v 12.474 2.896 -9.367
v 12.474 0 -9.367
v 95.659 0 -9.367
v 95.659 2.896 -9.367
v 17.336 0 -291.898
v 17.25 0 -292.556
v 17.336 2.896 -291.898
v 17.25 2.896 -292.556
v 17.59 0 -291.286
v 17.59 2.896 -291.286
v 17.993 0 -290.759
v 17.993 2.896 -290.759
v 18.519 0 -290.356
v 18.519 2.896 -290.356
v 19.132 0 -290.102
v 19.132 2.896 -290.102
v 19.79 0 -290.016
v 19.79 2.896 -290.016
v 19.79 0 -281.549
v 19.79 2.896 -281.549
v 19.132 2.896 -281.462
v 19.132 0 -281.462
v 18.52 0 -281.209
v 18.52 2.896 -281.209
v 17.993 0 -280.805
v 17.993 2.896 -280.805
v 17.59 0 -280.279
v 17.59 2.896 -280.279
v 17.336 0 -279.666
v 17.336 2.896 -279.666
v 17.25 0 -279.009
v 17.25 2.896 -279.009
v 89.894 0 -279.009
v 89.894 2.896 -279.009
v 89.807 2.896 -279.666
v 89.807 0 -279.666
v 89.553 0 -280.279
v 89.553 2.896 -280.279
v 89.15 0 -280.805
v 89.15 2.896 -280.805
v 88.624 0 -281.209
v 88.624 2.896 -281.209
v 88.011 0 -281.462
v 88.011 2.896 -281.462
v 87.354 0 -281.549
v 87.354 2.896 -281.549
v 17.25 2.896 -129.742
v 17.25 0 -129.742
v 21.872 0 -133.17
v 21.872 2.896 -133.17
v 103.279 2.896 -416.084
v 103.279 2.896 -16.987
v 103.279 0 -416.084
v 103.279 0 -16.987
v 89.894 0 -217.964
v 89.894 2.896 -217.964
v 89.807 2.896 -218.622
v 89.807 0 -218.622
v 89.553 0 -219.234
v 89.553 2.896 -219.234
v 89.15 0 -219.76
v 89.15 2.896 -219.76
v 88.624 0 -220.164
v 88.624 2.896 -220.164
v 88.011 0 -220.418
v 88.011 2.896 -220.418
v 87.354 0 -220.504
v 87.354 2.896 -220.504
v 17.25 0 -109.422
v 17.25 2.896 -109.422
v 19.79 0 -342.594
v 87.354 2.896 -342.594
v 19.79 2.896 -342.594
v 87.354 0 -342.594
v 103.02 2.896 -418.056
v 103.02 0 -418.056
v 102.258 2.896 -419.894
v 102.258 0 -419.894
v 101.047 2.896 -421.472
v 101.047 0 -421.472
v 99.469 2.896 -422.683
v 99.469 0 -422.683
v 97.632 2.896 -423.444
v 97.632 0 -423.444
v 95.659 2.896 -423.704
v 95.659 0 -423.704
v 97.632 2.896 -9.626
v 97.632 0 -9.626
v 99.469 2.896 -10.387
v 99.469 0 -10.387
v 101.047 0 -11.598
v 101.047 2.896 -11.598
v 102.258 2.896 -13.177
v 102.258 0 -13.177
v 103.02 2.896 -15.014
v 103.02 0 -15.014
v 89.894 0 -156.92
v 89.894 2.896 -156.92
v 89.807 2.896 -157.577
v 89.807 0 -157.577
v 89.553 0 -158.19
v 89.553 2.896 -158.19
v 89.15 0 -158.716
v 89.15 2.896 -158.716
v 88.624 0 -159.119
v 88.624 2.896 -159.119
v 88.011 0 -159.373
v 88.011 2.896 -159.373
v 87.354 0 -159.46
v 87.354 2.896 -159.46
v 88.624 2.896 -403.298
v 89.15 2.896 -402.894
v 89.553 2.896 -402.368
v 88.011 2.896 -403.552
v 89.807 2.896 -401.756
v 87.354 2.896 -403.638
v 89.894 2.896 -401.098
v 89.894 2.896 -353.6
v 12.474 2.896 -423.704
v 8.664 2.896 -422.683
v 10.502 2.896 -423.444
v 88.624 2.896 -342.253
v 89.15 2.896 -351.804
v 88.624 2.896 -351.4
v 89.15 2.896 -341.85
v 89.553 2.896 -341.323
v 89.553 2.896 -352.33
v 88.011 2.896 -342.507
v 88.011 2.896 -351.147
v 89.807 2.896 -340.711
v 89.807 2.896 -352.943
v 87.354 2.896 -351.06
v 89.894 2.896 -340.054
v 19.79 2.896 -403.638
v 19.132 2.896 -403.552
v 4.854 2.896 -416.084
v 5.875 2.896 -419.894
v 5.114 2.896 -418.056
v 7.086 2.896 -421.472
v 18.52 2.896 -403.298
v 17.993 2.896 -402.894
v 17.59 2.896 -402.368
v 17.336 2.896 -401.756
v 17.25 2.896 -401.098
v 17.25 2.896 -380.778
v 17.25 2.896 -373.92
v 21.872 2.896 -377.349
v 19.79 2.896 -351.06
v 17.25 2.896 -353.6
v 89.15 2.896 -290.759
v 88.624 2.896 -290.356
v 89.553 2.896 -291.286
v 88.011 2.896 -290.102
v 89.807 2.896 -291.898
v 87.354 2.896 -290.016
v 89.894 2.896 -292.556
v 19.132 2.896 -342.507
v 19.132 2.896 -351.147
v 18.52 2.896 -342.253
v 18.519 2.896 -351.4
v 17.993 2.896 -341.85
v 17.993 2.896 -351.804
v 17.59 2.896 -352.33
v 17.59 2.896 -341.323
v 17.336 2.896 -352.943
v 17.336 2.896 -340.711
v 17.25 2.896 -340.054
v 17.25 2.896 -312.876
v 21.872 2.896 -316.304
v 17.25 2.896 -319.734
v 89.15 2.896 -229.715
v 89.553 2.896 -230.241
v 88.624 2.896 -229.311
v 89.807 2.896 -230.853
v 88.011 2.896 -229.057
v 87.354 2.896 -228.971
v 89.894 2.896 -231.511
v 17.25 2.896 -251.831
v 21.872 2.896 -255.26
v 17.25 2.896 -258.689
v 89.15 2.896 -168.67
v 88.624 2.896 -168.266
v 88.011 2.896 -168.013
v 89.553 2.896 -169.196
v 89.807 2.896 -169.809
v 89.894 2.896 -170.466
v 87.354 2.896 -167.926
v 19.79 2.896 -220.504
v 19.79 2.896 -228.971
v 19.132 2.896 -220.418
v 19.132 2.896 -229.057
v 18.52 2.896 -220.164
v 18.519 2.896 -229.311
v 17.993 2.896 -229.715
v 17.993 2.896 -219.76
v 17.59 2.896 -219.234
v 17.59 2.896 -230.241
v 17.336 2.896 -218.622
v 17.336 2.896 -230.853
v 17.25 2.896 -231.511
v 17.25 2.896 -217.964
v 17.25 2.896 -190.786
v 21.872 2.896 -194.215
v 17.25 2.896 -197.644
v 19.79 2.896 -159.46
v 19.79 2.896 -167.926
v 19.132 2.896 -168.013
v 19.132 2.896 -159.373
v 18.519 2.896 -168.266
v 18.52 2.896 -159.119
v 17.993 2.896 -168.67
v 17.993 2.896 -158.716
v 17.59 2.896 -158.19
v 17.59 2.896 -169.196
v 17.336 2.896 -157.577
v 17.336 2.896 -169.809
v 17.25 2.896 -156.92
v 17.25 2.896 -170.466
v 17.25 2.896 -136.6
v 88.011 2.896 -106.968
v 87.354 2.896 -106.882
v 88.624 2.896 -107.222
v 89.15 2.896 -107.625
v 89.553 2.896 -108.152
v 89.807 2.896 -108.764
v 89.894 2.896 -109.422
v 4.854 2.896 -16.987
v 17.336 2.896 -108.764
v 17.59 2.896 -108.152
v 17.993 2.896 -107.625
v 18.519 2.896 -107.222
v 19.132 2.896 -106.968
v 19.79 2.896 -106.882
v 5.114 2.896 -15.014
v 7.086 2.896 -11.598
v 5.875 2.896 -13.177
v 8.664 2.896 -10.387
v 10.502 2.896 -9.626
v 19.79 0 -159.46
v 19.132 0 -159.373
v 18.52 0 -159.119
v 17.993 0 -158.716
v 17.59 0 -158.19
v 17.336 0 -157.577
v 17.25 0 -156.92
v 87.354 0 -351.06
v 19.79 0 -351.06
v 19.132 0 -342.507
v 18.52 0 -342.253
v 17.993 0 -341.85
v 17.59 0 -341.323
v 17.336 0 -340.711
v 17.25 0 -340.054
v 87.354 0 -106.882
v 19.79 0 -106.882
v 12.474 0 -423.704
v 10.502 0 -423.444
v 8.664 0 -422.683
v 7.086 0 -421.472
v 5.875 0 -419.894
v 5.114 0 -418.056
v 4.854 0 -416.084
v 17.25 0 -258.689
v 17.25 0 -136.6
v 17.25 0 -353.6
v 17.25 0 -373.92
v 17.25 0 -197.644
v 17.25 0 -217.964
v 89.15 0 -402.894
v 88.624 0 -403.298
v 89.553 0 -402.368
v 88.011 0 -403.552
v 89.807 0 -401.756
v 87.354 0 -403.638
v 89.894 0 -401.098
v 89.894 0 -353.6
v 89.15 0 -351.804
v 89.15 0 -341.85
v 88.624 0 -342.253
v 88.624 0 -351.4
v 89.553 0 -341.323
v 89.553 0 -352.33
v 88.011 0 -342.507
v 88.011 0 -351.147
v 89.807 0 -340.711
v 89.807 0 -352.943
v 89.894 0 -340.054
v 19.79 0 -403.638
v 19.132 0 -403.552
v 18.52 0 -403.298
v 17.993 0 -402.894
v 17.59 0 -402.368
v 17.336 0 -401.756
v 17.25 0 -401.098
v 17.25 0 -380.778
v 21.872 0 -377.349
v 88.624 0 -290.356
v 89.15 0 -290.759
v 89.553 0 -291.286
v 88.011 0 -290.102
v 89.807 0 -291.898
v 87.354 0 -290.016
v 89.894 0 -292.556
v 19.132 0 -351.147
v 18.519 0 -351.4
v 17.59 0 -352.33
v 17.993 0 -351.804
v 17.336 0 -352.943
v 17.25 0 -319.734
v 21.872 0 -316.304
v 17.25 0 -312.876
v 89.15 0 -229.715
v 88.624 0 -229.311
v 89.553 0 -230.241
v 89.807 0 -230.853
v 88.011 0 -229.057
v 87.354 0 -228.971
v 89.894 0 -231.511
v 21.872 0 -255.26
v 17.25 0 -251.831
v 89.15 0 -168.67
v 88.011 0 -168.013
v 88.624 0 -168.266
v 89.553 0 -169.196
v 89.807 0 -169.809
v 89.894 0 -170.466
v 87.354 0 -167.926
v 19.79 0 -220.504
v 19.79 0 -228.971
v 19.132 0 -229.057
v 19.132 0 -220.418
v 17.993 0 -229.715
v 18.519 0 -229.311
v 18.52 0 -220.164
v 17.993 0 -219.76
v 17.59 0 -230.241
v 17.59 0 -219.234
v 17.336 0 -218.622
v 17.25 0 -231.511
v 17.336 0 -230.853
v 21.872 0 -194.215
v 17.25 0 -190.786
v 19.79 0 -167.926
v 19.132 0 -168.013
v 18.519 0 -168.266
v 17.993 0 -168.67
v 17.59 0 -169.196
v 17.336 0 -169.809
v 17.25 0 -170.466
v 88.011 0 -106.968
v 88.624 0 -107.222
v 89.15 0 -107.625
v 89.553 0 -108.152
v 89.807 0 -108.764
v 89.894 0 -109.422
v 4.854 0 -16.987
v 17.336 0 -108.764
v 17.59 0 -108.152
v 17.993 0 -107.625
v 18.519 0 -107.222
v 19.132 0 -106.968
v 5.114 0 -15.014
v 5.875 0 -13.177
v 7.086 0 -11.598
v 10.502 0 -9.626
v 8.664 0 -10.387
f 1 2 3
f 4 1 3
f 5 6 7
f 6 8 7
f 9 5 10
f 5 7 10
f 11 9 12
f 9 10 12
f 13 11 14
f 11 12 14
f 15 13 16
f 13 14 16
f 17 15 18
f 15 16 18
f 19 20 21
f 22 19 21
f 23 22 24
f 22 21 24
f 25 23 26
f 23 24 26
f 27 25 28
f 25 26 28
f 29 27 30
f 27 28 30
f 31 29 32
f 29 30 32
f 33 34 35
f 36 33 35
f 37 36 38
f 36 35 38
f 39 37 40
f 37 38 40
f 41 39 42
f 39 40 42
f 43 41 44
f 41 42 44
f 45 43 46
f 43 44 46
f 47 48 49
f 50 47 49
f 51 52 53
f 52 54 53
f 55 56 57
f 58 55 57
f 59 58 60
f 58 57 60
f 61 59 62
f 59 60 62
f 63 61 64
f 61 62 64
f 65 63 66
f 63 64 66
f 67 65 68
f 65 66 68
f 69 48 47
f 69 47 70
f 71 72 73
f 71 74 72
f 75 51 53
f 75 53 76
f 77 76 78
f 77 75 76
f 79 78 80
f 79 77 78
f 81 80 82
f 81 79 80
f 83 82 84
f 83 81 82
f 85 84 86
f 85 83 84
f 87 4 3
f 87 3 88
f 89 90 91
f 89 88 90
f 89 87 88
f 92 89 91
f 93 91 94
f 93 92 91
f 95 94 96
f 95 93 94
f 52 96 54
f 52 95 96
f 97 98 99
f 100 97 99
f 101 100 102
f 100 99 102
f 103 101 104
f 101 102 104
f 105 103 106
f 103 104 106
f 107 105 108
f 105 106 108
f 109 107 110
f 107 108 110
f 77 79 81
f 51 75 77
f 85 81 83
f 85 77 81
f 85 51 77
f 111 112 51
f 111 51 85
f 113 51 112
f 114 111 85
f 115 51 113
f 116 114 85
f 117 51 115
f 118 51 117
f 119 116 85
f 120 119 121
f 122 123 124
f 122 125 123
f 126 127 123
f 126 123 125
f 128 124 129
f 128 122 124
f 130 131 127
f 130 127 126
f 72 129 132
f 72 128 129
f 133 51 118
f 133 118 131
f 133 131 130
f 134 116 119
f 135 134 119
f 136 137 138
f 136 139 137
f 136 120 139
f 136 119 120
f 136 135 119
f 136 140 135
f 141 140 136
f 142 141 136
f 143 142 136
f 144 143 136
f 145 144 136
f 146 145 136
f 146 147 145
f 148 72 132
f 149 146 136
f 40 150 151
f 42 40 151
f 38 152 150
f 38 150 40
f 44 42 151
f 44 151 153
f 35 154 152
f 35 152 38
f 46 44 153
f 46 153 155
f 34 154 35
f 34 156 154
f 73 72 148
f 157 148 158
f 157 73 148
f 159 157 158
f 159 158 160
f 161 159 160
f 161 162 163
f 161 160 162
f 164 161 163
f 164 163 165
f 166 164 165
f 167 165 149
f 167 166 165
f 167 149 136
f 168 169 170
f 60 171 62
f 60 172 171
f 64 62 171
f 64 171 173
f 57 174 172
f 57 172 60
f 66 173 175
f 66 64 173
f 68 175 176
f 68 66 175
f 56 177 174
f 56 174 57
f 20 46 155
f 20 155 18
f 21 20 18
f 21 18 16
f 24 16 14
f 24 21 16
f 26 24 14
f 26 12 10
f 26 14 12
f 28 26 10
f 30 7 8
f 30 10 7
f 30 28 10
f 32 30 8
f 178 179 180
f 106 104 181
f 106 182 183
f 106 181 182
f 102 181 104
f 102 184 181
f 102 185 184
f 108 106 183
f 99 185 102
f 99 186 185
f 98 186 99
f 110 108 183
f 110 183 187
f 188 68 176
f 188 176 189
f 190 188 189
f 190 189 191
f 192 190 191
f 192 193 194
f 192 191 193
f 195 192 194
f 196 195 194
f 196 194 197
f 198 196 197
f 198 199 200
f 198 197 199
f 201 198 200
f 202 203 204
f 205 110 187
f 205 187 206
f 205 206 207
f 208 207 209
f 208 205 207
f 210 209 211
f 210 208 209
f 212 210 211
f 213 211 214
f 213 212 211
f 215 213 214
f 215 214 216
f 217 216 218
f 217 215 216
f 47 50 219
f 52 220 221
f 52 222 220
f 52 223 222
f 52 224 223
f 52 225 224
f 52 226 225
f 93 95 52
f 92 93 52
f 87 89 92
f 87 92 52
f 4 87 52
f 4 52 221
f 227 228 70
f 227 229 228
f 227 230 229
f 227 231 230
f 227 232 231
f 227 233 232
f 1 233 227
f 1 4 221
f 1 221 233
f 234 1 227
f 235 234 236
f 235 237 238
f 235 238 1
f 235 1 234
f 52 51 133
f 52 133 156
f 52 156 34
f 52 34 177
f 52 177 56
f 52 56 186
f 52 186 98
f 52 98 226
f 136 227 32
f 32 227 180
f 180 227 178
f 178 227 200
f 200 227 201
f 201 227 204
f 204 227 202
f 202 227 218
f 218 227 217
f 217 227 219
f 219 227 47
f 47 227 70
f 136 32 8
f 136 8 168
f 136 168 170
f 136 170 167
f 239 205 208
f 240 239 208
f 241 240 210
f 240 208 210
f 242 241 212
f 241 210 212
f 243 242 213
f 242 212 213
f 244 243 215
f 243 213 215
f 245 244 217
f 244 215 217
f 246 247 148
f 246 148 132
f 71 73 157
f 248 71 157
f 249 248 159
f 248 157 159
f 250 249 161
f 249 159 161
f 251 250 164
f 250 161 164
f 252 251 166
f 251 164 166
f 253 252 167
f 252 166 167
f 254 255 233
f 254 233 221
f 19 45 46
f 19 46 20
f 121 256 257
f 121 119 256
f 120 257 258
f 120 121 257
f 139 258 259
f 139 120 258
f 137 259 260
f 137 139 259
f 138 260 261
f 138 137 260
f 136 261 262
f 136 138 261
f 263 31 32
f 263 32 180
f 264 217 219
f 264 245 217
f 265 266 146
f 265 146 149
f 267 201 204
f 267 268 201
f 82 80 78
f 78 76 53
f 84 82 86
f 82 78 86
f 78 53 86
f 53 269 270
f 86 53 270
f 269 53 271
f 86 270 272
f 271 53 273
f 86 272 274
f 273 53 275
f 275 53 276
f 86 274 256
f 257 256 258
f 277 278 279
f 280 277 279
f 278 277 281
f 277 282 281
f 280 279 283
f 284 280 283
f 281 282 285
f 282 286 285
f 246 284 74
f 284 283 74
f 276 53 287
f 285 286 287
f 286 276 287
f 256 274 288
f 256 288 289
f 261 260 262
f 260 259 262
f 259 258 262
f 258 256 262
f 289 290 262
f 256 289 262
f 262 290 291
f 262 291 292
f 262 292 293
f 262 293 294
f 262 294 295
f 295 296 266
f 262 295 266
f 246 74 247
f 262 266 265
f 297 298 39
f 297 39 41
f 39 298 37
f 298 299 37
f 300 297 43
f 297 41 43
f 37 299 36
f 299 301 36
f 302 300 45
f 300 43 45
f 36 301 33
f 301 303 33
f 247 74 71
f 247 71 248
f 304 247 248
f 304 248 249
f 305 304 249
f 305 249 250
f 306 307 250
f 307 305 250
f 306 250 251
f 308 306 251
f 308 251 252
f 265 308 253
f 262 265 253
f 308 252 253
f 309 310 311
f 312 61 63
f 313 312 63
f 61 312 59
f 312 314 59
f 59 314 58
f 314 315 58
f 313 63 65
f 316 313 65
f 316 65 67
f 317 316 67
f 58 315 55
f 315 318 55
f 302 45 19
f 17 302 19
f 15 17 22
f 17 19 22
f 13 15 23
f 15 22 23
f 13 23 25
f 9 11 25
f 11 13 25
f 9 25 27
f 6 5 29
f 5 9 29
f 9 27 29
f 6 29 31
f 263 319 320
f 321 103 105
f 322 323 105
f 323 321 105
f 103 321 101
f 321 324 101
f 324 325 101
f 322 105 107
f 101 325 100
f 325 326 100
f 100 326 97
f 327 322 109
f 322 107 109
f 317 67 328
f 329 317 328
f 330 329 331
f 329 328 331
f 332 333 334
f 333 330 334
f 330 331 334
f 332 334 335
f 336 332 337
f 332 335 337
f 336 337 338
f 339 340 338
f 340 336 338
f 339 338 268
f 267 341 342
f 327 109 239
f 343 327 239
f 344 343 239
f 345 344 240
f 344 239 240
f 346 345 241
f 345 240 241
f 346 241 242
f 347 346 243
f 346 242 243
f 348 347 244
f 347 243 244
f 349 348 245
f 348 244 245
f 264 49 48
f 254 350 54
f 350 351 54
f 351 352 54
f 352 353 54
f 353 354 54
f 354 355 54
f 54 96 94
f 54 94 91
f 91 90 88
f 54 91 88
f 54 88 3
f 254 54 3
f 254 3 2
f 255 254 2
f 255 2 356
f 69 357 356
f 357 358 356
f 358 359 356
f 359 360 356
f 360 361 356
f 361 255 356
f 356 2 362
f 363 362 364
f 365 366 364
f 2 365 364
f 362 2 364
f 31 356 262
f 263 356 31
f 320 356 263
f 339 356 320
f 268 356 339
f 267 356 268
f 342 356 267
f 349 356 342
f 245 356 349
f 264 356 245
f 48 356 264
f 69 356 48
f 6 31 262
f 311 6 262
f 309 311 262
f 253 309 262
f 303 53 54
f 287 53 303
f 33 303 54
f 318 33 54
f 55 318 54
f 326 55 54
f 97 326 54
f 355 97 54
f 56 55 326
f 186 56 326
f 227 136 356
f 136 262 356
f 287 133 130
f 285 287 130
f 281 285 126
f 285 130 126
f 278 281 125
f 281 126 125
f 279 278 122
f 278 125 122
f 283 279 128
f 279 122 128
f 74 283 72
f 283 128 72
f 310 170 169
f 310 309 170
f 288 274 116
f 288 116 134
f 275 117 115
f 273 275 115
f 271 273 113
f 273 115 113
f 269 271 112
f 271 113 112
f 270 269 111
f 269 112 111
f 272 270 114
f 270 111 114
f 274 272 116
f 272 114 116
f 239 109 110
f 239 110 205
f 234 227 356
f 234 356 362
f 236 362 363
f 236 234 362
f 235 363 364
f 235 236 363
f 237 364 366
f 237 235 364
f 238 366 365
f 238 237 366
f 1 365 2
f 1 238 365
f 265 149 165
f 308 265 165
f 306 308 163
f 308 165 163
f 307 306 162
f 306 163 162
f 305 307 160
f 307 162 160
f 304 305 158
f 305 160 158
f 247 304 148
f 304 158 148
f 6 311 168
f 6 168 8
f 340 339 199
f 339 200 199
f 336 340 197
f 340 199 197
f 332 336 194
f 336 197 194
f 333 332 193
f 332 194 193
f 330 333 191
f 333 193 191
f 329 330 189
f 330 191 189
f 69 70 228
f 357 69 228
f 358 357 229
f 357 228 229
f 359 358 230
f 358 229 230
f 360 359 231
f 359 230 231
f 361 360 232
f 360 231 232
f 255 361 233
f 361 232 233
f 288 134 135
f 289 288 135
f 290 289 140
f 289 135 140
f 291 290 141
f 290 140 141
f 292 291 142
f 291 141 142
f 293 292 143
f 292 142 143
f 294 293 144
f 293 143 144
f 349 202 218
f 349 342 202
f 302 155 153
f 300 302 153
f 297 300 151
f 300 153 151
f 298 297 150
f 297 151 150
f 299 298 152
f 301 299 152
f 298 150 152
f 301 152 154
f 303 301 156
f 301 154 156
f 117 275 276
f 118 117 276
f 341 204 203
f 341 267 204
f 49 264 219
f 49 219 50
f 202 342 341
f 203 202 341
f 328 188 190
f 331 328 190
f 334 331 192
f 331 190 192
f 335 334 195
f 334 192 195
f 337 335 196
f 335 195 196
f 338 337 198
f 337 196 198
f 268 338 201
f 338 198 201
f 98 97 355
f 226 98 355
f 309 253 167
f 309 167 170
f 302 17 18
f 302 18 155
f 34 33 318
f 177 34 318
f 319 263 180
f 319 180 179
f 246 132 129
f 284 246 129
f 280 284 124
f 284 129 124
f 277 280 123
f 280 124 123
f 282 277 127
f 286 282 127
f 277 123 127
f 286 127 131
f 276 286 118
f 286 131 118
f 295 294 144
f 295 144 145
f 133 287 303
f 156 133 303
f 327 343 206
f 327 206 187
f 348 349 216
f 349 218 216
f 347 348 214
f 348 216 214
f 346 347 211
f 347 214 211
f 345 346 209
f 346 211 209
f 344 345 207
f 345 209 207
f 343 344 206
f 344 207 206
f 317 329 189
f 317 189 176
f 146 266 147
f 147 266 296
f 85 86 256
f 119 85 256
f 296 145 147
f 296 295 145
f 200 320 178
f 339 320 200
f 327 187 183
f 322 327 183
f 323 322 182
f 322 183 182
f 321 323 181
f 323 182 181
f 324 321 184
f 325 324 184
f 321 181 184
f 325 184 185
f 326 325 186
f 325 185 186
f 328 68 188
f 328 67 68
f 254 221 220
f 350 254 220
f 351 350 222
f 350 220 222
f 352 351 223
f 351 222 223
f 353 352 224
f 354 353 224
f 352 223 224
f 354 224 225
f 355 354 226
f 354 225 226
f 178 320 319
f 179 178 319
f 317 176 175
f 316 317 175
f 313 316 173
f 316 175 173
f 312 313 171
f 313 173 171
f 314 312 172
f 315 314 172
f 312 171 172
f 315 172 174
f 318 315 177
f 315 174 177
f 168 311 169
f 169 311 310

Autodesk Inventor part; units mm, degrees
ref_plane "YZ Plane" through (0, 0, 0) normal (1, 0, 0) x (0, 1, 0)
ref_plane "XZ Plane" through (0, 0, 0) normal (0, 1, 0) x (-1, 0, 0)
ref_plane "XY Plane" through (0, 0, 0) normal (0, 0, 1) x (1, 0, 0)
sketch "Sketch1" plane through (0, 0, 0) normal (0, 1, 0) x (-1, 0, 0)
  line L0 (-4.8543, -9.3666) -> (-103.2793, -9.3666)
  line L1 (-103.2793, -9.3666) -> (-103.2793, -423.7041)
  line L2 (-103.2793, -423.7041) -> (-4.8543, -423.7041)
  line L3 (-4.8543, -423.7041) -> (-4.8543, -9.3666)
  line L4 (-103.2793, -423.7041) -> (-89.8935, -423.7041) construction
  line L5 (-103.2793, -423.7041) -> (-89.8935, -423.7041) construction
  line L6 (-89.8935, -423.7041) -> (-89.8935, -403.6381) construction
  line L7 (-89.8935, -403.6381) -> (-89.8935, -351.0601)
  line L8 (-89.8935, -351.0601) -> (-89.8935, -342.5935) construction
  line L9 (-89.8935, -342.5935) -> (-89.8935, -290.0155)
  line L10 (-89.8935, -290.0155) -> (-89.8935, -281.5488) construction
  line L11 (-89.8935, -281.5488) -> (-89.8935, -228.9708)
  line L12 (-89.8935, -228.9708) -> (-89.8935, -220.5041) construction
  line L13 (-89.8935, -220.5041) -> (-89.8935, -167.9261)
  line L14 (-89.8935, -167.9261) -> (-89.8935, -159.4595) construction
  line L15 (-89.8935, -159.4595) -> (-89.8935, -106.8815)
  line L16 (-89.8935, -403.6381) -> (-17.2495, -403.6381)
  line L17 (-17.2495, -351.0601) -> (-89.8935, -351.0601)
  line L18 (-89.8935, -342.5935) -> (-17.2495, -342.5935)
  line L19 (-17.2495, -290.0155) -> (-89.8935, -290.0155)
  line L20 (-89.8935, -281.5488) -> (-17.2495, -281.5488)
  line L21 (-17.2495, -228.9708) -> (-89.8935, -228.9708)
  line L22 (-89.8935, -220.5041) -> (-17.2495, -220.5041)
  line L23 (-17.2495, -167.9261) -> (-89.8935, -167.9261)
  line L24 (-89.8935, -159.4595) -> (-17.2495, -159.4595)
  line L25 (-17.2495, -106.8815) -> (-89.8935, -106.8815)
  line L26 (-17.2495, -373.9201) -> (-21.8723, -377.3491)
  line L27 (-17.2495, -380.7781) -> (-21.8723, -377.3491)
  line L28 (-17.2495, -319.7335) -> (-21.8723, -316.3045)
  line L29 (-17.2495, -312.8755) -> (-21.8723, -316.3045)
  line L30 (-17.2495, -258.6888) -> (-21.8723, -255.2598)
  line L31 (-17.2495, -251.8308) -> (-21.8723, -255.2598)
  line L32 (-17.2495, -190.7861) -> (-21.8723, -194.2151)
  line L33 (-17.2495, -197.6441) -> (-21.8723, -194.2151)
  line L34 (-17.2495, -136.5995) -> (-21.8723, -133.1705)
  line L35 (-17.2495, -129.7415) -> (-21.8723, -133.1705)
  line L36 (-17.2495, -403.6381) -> (-17.2495, -380.7781)
  line L37 (-17.2495, -373.9201) -> (-17.2495, -351.0601)
  line L38 (-17.2495, -342.5935) -> (-17.2495, -319.7335)
  line L39 (-17.2495, -312.8755) -> (-17.2495, -290.0155)
  line L40 (-17.2495, -281.5488) -> (-17.2495, -258.6888)
  line L41 (-17.2495, -251.8308) -> (-17.2495, -228.9708)
  line L42 (-17.2495, -220.5041) -> (-17.2495, -197.6441)
  line L43 (-17.2495, -190.7861) -> (-17.2495, -167.9261)
  line L44 (-17.2495, -159.4595) -> (-17.2495, -136.5995)
  line L45 (-17.2495, -129.7415) -> (-17.2495, -106.8815)
  point P0 (0, 0)
  dimension "d0" = 98.425
  dimension "d1" = 414.3375
  dimension "d2" = 13.3858
  dimension "d4" = 20.066
  dimension "d5" = 52.578
  dimension "d6" = 8.4667
  dimension "d7" = 52.578
  dimension "d8" = 8.4667
  dimension "d9" = 52.578
  dimension "d10" = 8.4667
  dimension "d11" = 52.578
  dimension "d12" = 8.4667
  dimension "d13" = 52.578
  dimension "d16" = 72.644
extrude "Extrusion1" add sketch "Sketch1" along normal blind 2.8956
fillet "Fillet1" radius 2.54 20 edges at (17.2495, 1.4478, -106.8815) (17.2495, 1.4478, -159.4595) (17.2495, 1.4478, -167.9261) (17.2495, 1.4478, -228.9708) (17.2495, 1.4478, -290.0155) (17.2495, 1.4478, -351.0601) (17.2495, 1.4478, -403.6381) (17.2495, 1.4478, -342.5935) (17.2495, 1.4478, -281.5488) (17.2495, 1.4478, -220.5041) (89.8935, 1.4478, -403.6381) (89.8935, 1.4478, -342.5935) (89.8935, 1.4478, -281.5488) (89.8935, 1.4478, -220.5041) (89.8935, 1.4478, -159.4595) (89.8935, 1.4478, -106.8815) (89.8935, 1.4478, -167.9261) (89.8935, 1.4478, -228.9708) (89.8935, 1.4478, -290.0155) (89.8935, 1.4478, -351.0601)
fillet "Fillet2" radius 7.62 4 edges at (4.8543, 1.4478, -9.3666) (103.2793, 1.4478, -9.3666) (4.8543, 1.4478, -423.7041) (103.2793, 1.4478, -423.7041)
properties part number "clock face"
